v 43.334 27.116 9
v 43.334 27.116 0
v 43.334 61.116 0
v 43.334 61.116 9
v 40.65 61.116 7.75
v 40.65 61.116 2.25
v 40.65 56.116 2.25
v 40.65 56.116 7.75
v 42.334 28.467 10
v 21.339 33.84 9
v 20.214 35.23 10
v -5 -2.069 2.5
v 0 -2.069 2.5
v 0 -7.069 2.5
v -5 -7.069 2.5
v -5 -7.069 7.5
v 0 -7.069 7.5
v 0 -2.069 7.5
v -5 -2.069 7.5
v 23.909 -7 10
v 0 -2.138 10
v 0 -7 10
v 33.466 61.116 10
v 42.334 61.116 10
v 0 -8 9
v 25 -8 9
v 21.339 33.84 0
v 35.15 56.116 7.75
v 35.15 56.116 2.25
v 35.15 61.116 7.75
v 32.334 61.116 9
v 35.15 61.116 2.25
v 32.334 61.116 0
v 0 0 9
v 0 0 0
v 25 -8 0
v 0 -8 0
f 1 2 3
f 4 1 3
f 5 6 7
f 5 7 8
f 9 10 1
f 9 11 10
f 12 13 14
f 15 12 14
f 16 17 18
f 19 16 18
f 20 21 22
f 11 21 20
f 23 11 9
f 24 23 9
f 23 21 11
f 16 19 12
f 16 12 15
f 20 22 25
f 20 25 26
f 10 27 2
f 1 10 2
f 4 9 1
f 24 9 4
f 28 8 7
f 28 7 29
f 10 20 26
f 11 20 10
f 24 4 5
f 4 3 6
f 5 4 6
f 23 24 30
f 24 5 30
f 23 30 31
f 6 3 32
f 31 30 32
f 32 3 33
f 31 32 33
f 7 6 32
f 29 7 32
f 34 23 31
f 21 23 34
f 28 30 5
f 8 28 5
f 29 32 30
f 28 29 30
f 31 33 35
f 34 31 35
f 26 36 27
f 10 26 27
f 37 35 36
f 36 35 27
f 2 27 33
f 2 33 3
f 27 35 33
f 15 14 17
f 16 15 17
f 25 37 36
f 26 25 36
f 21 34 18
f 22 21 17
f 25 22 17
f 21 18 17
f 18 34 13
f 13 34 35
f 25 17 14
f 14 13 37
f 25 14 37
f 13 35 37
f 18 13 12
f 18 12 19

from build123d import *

# Parameters (mm, degrees)
F1_DEPTH = 10
F2_SIZE  = 1
F3_W     = 2.5
F3_H     = 5
F4_DEPTH = 5
F5_W     = 2.75
F5_H     = 5.5
F6_DEPTH = 5


with BuildPart() as f1:
    # F0 (on Top) → F1 (new body)
    with BuildSketch(Plane.XY):
        Polygon((32.334468, 61.115628), (0, 0), (0, -8), (25, -8), (21.339459, 33.840177), (43.334468, 27.115628), (43.334468, 61.115628), align=None)
    extrude(amount=F1_DEPTH)

    # F2
    f2_edges = [f1.edges().sort_by_distance(p)[0] for p in [
        (16.167234, 30.557814, 10),
        (12.5, -8, 10),
        (23.169729, 12.920089, 10),
        (32.336963, 30.477903, 10),
        (43.334468, 44.115628, 10),
    ]]
    chamfer(f2_edges, length=F2_SIZE)

    # F3 (on face) → F4 (join)
    with BuildSketch(Plane(origin=(0, 0, 0), x_dir=(0, -1, 0), z_dir=(-1, 0, 0))):
        with Locations((5.819171, 5)):
            Rectangle(F3_W, F3_H)
        with Locations((3.319171, 5)):
            Rectangle(F3_W, F3_H)
    extrude(amount=F4_DEPTH)

    # F5 (on face) → F6 (cut)
    with BuildSketch(Plane(origin=(0, 61.115628, 0), x_dir=(-1, 0, 0), z_dir=(0, 1, 0))):
        with Locations((-36.525135, 5)):
            Rectangle(F5_W, F5_H)
        with Locations((-39.275135, 5)):
            Rectangle(F5_W, F5_H)
    extrude(amount=-F6_DEPTH, mode=Mode.SUBTRACT)


solid = f1.part
